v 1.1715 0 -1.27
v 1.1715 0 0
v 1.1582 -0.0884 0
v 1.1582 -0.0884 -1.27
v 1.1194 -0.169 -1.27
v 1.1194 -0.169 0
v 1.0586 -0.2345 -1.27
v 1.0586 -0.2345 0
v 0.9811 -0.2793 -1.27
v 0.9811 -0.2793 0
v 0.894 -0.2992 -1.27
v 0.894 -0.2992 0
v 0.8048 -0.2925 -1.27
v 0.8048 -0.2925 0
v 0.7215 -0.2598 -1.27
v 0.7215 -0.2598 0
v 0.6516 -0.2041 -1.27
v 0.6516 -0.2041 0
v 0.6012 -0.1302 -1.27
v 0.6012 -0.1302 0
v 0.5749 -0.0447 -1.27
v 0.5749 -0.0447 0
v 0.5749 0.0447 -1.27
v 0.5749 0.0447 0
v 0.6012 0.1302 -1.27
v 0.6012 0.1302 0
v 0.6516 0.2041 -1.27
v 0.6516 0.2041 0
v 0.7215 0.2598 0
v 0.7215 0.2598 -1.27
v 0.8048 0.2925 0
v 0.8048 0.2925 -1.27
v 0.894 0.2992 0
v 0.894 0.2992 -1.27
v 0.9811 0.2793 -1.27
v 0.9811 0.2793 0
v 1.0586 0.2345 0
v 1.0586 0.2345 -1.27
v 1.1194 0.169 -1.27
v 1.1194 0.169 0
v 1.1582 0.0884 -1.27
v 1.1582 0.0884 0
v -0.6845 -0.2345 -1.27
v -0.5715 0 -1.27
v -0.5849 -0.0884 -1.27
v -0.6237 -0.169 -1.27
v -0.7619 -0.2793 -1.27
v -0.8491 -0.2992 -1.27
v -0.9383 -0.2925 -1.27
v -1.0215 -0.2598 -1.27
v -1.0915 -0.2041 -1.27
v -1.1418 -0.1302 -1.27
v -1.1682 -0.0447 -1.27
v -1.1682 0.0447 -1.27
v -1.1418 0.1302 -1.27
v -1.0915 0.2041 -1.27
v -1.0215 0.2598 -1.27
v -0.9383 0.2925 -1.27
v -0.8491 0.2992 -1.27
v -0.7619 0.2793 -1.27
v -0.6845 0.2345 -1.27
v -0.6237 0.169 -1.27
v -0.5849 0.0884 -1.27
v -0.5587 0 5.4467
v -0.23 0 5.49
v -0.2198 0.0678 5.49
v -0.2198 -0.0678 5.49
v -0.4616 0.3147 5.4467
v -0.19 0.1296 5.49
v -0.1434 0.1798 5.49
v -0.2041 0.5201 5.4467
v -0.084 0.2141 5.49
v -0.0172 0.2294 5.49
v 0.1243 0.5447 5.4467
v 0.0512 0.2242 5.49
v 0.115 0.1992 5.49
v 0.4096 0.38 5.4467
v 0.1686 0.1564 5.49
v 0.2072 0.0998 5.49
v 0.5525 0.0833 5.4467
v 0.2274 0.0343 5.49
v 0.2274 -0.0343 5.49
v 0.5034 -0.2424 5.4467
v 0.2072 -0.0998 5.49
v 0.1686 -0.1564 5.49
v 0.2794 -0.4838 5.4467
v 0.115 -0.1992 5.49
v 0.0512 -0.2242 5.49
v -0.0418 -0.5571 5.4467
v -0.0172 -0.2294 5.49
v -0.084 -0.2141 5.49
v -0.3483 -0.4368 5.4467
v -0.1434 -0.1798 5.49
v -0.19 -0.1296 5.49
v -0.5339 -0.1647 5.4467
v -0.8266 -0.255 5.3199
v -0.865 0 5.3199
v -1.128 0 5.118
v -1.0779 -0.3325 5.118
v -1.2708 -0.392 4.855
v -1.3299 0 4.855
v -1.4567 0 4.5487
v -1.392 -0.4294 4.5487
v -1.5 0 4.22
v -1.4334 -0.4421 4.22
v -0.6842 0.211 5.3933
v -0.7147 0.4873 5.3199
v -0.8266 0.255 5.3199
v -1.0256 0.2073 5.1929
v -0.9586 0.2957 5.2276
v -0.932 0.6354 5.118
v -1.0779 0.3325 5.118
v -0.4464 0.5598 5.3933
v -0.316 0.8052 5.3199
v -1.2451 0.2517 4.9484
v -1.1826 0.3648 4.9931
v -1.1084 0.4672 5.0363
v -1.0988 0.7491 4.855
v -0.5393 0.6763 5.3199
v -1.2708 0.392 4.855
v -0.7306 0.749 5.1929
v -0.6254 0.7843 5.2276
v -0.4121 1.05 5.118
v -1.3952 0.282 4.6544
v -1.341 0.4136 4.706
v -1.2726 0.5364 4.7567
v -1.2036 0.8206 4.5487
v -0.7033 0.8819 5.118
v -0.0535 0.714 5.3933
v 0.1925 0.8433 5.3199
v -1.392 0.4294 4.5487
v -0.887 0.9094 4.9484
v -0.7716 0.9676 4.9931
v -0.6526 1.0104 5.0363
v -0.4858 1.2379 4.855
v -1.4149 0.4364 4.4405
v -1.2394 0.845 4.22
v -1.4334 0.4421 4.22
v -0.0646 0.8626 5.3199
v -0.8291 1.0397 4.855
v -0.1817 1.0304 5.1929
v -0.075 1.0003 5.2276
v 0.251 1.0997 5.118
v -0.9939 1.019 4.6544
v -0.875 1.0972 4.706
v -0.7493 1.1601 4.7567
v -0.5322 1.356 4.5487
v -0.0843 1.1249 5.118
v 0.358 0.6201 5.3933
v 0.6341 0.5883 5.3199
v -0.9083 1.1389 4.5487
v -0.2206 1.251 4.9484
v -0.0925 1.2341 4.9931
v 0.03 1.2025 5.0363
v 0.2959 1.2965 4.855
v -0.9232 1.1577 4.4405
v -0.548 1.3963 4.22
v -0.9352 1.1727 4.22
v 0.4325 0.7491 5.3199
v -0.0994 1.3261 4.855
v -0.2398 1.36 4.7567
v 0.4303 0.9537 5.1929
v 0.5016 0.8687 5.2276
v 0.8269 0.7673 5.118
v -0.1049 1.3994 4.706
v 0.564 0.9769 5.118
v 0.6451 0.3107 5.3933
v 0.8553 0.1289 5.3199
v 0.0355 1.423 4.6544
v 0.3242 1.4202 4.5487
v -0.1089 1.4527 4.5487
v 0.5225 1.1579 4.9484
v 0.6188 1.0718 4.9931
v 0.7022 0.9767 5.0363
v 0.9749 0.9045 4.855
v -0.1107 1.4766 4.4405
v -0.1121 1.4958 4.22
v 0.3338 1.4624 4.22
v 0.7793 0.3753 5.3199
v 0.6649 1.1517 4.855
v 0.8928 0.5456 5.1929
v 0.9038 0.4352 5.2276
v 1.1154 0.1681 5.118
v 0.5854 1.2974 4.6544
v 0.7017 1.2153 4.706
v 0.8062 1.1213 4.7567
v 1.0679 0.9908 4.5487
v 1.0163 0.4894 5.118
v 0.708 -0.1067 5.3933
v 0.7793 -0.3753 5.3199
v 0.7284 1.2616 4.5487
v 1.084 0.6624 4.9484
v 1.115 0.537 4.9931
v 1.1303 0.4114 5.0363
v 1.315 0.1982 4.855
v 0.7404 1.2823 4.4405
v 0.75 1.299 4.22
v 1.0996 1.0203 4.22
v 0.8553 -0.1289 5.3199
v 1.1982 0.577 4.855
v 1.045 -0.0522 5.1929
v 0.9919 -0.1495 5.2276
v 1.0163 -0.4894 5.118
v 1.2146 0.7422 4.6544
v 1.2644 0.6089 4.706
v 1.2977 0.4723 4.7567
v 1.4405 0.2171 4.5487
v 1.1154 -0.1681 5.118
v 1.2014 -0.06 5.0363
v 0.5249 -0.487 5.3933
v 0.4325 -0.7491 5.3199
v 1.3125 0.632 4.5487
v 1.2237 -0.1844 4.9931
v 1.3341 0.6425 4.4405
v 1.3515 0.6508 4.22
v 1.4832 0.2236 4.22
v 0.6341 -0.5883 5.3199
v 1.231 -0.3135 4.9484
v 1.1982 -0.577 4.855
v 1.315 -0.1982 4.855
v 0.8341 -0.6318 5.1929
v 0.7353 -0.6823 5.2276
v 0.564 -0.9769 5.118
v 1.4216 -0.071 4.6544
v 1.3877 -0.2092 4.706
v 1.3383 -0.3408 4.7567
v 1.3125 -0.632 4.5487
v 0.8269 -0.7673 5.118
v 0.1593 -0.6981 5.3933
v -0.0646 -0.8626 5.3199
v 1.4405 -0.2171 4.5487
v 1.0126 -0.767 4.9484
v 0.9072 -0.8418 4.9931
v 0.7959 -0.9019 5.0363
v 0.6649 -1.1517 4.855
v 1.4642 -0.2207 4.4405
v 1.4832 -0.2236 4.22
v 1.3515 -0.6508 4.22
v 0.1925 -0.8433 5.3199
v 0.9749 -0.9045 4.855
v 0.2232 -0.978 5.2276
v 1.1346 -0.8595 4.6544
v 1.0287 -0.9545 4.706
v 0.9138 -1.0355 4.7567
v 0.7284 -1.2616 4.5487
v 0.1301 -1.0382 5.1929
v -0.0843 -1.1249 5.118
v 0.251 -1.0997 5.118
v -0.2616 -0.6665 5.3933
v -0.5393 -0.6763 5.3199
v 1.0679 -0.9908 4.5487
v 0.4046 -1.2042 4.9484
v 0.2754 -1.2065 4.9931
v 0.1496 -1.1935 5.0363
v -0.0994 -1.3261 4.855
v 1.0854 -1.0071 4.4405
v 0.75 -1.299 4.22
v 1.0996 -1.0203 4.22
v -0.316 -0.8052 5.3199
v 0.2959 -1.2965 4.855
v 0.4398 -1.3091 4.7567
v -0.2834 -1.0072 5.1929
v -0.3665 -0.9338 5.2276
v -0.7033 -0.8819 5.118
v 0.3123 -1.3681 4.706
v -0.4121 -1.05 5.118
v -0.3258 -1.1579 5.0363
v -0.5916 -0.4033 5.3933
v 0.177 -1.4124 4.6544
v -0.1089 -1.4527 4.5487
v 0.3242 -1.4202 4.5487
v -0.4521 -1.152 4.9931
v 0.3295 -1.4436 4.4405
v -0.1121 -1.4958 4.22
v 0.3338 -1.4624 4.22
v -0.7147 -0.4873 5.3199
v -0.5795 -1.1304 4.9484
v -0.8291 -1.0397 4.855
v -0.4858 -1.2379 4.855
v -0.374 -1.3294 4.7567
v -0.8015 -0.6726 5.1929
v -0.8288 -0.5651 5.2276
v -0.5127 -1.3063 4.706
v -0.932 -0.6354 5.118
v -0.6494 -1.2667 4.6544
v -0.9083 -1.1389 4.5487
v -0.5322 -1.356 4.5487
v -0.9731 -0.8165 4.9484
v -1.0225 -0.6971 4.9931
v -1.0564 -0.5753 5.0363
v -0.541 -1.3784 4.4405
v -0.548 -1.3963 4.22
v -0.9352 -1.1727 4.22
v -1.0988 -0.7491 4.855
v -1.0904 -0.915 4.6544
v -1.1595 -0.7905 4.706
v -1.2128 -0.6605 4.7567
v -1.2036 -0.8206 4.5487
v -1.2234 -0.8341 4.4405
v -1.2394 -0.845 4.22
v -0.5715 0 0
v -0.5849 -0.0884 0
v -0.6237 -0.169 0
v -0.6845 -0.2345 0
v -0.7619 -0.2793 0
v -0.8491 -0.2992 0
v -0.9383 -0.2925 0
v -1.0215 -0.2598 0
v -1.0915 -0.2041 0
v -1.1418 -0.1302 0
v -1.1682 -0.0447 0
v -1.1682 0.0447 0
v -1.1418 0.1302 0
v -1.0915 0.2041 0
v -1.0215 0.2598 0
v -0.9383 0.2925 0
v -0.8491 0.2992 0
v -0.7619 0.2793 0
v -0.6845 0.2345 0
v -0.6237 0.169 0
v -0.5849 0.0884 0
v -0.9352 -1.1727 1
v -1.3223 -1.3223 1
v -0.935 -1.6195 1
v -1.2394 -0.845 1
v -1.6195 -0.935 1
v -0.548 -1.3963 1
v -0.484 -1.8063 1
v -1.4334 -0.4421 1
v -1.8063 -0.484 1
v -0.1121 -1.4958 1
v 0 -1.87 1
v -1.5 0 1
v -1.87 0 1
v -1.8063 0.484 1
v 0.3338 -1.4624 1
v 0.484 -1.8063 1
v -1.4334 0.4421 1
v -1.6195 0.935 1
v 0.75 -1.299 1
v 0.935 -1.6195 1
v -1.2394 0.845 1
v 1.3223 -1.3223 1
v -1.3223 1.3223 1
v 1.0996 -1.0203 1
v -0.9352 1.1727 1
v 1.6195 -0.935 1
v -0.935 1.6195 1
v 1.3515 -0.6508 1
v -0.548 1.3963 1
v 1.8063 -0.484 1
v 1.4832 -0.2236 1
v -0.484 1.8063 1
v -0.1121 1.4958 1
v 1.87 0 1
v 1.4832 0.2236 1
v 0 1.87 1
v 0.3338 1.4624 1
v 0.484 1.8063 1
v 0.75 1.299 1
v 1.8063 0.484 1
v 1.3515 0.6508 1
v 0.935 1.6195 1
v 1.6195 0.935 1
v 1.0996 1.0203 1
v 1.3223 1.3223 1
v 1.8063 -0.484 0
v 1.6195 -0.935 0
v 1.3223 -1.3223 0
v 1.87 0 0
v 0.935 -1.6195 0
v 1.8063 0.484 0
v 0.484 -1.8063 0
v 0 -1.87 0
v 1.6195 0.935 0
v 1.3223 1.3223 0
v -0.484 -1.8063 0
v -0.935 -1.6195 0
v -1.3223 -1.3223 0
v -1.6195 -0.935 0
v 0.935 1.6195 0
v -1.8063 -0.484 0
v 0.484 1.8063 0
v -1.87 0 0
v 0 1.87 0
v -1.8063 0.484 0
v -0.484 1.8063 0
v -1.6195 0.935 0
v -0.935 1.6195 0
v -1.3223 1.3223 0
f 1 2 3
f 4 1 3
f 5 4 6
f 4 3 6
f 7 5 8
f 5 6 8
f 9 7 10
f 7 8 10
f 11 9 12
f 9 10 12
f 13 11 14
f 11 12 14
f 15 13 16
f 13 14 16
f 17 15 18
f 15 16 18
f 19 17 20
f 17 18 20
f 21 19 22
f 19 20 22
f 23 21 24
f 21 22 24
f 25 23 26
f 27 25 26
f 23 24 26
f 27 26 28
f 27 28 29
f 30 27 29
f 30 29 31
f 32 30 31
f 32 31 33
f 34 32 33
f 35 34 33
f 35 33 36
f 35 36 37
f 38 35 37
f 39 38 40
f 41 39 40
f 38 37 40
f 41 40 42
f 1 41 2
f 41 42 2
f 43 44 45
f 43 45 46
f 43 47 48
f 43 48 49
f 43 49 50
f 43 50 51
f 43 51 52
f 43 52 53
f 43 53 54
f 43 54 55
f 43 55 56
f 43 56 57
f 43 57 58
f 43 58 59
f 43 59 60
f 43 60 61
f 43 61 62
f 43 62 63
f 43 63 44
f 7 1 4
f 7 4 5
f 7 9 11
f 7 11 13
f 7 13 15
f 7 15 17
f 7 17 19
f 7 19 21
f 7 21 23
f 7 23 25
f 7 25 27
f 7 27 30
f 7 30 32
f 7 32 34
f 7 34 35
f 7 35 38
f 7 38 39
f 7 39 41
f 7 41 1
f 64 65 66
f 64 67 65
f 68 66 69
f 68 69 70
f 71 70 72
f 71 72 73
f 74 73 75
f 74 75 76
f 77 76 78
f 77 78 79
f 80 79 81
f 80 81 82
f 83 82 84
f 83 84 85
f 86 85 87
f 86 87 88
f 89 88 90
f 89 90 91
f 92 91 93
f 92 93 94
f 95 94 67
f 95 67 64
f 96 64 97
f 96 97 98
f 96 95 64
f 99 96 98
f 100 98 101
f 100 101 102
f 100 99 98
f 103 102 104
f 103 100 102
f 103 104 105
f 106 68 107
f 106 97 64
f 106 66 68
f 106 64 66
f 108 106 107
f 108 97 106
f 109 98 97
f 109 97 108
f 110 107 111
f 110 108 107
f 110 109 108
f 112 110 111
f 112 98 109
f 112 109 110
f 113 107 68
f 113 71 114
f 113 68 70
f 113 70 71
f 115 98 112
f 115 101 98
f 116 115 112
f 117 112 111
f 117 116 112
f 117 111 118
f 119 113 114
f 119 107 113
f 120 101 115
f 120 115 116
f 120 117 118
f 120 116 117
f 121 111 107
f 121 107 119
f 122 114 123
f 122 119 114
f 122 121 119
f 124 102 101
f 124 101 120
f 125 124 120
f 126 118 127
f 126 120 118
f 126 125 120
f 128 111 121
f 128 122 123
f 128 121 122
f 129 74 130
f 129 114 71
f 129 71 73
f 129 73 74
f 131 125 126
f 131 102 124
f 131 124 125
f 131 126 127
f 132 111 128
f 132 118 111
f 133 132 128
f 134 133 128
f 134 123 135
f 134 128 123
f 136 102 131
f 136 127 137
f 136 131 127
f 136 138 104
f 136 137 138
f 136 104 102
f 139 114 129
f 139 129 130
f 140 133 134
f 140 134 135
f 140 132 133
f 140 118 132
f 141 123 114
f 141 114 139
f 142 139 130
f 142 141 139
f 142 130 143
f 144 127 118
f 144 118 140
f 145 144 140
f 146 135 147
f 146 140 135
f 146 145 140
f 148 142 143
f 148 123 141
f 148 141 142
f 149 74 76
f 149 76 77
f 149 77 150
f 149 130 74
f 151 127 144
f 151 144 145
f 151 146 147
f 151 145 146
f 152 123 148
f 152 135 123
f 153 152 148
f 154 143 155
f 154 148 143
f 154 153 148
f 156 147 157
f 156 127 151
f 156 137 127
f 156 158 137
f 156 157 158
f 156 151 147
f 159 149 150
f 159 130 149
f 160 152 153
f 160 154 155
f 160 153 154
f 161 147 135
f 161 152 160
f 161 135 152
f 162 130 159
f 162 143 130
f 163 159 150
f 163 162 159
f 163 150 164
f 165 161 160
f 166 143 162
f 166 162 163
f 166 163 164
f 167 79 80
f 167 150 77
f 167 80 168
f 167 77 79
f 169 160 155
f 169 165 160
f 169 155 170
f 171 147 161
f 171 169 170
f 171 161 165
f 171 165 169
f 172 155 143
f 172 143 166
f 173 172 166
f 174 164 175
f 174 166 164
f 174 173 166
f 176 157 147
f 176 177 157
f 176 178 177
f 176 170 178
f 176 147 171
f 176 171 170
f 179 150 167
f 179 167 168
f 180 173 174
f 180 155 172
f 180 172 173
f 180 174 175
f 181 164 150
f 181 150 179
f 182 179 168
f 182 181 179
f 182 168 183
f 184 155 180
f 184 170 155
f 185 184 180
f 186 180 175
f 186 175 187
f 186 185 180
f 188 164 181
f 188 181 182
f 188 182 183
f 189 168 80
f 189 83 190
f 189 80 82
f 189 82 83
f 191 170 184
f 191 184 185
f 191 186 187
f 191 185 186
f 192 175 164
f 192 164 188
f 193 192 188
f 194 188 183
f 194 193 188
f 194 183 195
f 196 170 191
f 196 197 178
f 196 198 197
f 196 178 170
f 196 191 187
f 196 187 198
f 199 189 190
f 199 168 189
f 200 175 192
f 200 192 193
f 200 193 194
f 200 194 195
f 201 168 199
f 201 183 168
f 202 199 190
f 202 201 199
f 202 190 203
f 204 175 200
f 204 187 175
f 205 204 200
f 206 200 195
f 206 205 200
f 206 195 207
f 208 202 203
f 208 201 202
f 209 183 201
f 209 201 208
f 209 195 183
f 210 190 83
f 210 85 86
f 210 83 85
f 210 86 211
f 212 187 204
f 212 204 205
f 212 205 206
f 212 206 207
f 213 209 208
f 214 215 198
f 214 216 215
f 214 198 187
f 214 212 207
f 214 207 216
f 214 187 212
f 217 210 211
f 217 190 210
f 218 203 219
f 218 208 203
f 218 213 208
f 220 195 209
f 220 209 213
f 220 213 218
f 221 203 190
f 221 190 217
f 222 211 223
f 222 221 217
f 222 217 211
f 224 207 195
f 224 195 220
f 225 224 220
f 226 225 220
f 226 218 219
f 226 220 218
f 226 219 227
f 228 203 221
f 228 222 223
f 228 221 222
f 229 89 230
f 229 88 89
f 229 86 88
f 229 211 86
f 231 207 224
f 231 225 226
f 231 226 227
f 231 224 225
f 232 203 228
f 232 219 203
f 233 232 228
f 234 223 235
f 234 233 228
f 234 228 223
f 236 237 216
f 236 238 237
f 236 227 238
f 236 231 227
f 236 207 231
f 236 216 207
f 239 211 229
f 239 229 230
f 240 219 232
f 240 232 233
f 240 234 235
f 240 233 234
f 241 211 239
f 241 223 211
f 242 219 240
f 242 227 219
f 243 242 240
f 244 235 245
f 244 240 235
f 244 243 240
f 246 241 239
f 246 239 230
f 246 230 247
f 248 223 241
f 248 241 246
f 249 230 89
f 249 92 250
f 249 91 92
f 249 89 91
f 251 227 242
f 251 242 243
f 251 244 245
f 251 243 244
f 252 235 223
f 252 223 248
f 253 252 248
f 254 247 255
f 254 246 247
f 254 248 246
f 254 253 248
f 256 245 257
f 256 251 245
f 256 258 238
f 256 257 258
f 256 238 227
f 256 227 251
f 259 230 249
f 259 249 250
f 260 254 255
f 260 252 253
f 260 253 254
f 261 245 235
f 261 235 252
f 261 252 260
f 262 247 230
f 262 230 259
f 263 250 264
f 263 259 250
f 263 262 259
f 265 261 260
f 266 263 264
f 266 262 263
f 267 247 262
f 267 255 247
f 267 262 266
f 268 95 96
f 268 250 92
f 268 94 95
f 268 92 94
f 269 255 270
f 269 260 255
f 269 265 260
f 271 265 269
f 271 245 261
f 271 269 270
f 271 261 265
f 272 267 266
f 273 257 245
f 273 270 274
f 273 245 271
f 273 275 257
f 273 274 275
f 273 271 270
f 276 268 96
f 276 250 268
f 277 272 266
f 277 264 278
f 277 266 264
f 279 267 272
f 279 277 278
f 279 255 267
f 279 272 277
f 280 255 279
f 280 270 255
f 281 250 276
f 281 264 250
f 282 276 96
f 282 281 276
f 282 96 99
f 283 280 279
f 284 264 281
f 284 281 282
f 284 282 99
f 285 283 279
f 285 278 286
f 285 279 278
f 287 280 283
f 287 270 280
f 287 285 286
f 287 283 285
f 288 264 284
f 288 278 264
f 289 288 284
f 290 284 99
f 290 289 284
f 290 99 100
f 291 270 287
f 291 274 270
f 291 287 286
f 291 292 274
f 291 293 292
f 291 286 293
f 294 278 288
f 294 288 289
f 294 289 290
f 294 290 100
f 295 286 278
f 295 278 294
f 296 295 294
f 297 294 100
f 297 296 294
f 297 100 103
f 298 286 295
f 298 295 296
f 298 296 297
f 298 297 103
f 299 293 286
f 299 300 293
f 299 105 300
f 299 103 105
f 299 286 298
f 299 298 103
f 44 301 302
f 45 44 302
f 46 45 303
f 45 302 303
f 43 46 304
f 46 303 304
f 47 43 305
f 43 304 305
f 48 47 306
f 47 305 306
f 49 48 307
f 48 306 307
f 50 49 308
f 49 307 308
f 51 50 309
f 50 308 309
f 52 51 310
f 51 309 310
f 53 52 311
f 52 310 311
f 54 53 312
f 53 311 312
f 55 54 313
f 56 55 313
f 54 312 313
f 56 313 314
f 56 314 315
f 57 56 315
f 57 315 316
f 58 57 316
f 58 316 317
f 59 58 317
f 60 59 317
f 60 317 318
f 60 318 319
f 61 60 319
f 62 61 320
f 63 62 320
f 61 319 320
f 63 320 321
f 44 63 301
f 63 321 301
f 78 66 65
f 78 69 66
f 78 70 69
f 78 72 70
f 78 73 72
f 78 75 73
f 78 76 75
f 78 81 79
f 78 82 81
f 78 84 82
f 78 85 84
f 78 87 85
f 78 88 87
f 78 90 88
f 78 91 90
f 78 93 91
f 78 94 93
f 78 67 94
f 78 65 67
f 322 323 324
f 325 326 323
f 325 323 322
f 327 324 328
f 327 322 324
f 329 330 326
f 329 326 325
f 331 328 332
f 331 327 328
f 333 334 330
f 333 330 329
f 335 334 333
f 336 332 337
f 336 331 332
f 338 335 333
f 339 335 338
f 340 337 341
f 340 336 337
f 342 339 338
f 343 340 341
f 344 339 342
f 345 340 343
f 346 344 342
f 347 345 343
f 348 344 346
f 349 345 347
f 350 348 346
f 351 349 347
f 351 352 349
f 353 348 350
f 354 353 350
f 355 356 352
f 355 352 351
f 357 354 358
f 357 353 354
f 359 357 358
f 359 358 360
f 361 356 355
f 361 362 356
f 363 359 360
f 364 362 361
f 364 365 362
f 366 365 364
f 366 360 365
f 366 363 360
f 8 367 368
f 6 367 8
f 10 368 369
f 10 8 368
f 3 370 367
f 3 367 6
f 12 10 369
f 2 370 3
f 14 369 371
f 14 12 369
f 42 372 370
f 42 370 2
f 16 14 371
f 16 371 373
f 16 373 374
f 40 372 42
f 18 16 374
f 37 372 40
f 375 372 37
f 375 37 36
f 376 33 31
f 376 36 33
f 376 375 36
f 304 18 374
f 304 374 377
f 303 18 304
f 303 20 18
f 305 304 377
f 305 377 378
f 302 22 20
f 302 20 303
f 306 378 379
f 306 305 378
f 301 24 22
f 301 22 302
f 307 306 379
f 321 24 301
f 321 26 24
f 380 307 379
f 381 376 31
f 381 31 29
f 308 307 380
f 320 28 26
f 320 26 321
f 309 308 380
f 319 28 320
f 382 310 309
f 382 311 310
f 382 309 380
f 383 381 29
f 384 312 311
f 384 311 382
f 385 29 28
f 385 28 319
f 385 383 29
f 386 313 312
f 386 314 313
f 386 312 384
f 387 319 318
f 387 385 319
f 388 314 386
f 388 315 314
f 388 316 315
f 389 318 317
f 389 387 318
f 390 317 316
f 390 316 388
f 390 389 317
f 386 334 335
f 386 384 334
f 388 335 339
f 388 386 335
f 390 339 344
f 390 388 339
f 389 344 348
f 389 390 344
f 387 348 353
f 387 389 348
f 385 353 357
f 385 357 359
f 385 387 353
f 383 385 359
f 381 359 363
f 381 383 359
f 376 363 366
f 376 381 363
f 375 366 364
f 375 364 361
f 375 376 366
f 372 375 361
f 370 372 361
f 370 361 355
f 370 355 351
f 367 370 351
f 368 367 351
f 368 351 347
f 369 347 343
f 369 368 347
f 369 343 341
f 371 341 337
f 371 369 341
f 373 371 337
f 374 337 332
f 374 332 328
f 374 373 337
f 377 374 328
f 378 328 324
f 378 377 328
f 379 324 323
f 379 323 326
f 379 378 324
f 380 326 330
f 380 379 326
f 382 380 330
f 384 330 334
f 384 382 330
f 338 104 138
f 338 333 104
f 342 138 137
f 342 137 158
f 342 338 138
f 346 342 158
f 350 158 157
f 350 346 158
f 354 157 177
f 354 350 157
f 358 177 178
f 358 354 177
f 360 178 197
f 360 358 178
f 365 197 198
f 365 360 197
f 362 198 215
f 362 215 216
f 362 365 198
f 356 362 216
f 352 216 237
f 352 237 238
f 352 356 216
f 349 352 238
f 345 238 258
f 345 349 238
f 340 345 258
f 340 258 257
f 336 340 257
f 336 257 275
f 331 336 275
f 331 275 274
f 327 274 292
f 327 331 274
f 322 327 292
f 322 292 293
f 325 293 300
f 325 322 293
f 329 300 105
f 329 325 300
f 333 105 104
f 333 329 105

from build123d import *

# Parameters (mm, degrees)
F2_R     = 0.3
F3_DEPTH = 1.27


# Not quite as in the source:
# - a feature names something its author has since deleted; it is built from what else it names


with BuildPart() as f1:
    # F0 (on Front) → F1 (revolve)
    with BuildSketch(Plane.XZ):
        with BuildLine():
            Line((-1.87, 0), (0, 0))
            Line((0, 0), (0, 5.49))
            Line((0, 5.49), (-0.23, 5.49))
            ThreePointArc((-0.23, 5.49), (-1.1280256121, 5.1180256121), (-1.5, 4.22))
            Line((-1.5, 4.22), (-1.5, 1))
            Line((-1.5, 1), (-1.87, 1))
            Line((-1.87, 1), (-1.87, 0))
        make_face()
    revolve(axis=Axis((0, 0, 2.745), (0, 0, -1)))

    # F2 (on face) → F3 (join)
    with BuildSketch(Plane(origin=(0, 0, 0), x_dir=(1, 0, 0), z_dir=(0, 0, -1))):
        with Locations((-0.8715403965, 0)):
            Circle(F2_R)
        with Locations((0.8715403965, 0)):
            Circle(F2_R)
    extrude(amount=F3_DEPTH)


solid = f1.part
